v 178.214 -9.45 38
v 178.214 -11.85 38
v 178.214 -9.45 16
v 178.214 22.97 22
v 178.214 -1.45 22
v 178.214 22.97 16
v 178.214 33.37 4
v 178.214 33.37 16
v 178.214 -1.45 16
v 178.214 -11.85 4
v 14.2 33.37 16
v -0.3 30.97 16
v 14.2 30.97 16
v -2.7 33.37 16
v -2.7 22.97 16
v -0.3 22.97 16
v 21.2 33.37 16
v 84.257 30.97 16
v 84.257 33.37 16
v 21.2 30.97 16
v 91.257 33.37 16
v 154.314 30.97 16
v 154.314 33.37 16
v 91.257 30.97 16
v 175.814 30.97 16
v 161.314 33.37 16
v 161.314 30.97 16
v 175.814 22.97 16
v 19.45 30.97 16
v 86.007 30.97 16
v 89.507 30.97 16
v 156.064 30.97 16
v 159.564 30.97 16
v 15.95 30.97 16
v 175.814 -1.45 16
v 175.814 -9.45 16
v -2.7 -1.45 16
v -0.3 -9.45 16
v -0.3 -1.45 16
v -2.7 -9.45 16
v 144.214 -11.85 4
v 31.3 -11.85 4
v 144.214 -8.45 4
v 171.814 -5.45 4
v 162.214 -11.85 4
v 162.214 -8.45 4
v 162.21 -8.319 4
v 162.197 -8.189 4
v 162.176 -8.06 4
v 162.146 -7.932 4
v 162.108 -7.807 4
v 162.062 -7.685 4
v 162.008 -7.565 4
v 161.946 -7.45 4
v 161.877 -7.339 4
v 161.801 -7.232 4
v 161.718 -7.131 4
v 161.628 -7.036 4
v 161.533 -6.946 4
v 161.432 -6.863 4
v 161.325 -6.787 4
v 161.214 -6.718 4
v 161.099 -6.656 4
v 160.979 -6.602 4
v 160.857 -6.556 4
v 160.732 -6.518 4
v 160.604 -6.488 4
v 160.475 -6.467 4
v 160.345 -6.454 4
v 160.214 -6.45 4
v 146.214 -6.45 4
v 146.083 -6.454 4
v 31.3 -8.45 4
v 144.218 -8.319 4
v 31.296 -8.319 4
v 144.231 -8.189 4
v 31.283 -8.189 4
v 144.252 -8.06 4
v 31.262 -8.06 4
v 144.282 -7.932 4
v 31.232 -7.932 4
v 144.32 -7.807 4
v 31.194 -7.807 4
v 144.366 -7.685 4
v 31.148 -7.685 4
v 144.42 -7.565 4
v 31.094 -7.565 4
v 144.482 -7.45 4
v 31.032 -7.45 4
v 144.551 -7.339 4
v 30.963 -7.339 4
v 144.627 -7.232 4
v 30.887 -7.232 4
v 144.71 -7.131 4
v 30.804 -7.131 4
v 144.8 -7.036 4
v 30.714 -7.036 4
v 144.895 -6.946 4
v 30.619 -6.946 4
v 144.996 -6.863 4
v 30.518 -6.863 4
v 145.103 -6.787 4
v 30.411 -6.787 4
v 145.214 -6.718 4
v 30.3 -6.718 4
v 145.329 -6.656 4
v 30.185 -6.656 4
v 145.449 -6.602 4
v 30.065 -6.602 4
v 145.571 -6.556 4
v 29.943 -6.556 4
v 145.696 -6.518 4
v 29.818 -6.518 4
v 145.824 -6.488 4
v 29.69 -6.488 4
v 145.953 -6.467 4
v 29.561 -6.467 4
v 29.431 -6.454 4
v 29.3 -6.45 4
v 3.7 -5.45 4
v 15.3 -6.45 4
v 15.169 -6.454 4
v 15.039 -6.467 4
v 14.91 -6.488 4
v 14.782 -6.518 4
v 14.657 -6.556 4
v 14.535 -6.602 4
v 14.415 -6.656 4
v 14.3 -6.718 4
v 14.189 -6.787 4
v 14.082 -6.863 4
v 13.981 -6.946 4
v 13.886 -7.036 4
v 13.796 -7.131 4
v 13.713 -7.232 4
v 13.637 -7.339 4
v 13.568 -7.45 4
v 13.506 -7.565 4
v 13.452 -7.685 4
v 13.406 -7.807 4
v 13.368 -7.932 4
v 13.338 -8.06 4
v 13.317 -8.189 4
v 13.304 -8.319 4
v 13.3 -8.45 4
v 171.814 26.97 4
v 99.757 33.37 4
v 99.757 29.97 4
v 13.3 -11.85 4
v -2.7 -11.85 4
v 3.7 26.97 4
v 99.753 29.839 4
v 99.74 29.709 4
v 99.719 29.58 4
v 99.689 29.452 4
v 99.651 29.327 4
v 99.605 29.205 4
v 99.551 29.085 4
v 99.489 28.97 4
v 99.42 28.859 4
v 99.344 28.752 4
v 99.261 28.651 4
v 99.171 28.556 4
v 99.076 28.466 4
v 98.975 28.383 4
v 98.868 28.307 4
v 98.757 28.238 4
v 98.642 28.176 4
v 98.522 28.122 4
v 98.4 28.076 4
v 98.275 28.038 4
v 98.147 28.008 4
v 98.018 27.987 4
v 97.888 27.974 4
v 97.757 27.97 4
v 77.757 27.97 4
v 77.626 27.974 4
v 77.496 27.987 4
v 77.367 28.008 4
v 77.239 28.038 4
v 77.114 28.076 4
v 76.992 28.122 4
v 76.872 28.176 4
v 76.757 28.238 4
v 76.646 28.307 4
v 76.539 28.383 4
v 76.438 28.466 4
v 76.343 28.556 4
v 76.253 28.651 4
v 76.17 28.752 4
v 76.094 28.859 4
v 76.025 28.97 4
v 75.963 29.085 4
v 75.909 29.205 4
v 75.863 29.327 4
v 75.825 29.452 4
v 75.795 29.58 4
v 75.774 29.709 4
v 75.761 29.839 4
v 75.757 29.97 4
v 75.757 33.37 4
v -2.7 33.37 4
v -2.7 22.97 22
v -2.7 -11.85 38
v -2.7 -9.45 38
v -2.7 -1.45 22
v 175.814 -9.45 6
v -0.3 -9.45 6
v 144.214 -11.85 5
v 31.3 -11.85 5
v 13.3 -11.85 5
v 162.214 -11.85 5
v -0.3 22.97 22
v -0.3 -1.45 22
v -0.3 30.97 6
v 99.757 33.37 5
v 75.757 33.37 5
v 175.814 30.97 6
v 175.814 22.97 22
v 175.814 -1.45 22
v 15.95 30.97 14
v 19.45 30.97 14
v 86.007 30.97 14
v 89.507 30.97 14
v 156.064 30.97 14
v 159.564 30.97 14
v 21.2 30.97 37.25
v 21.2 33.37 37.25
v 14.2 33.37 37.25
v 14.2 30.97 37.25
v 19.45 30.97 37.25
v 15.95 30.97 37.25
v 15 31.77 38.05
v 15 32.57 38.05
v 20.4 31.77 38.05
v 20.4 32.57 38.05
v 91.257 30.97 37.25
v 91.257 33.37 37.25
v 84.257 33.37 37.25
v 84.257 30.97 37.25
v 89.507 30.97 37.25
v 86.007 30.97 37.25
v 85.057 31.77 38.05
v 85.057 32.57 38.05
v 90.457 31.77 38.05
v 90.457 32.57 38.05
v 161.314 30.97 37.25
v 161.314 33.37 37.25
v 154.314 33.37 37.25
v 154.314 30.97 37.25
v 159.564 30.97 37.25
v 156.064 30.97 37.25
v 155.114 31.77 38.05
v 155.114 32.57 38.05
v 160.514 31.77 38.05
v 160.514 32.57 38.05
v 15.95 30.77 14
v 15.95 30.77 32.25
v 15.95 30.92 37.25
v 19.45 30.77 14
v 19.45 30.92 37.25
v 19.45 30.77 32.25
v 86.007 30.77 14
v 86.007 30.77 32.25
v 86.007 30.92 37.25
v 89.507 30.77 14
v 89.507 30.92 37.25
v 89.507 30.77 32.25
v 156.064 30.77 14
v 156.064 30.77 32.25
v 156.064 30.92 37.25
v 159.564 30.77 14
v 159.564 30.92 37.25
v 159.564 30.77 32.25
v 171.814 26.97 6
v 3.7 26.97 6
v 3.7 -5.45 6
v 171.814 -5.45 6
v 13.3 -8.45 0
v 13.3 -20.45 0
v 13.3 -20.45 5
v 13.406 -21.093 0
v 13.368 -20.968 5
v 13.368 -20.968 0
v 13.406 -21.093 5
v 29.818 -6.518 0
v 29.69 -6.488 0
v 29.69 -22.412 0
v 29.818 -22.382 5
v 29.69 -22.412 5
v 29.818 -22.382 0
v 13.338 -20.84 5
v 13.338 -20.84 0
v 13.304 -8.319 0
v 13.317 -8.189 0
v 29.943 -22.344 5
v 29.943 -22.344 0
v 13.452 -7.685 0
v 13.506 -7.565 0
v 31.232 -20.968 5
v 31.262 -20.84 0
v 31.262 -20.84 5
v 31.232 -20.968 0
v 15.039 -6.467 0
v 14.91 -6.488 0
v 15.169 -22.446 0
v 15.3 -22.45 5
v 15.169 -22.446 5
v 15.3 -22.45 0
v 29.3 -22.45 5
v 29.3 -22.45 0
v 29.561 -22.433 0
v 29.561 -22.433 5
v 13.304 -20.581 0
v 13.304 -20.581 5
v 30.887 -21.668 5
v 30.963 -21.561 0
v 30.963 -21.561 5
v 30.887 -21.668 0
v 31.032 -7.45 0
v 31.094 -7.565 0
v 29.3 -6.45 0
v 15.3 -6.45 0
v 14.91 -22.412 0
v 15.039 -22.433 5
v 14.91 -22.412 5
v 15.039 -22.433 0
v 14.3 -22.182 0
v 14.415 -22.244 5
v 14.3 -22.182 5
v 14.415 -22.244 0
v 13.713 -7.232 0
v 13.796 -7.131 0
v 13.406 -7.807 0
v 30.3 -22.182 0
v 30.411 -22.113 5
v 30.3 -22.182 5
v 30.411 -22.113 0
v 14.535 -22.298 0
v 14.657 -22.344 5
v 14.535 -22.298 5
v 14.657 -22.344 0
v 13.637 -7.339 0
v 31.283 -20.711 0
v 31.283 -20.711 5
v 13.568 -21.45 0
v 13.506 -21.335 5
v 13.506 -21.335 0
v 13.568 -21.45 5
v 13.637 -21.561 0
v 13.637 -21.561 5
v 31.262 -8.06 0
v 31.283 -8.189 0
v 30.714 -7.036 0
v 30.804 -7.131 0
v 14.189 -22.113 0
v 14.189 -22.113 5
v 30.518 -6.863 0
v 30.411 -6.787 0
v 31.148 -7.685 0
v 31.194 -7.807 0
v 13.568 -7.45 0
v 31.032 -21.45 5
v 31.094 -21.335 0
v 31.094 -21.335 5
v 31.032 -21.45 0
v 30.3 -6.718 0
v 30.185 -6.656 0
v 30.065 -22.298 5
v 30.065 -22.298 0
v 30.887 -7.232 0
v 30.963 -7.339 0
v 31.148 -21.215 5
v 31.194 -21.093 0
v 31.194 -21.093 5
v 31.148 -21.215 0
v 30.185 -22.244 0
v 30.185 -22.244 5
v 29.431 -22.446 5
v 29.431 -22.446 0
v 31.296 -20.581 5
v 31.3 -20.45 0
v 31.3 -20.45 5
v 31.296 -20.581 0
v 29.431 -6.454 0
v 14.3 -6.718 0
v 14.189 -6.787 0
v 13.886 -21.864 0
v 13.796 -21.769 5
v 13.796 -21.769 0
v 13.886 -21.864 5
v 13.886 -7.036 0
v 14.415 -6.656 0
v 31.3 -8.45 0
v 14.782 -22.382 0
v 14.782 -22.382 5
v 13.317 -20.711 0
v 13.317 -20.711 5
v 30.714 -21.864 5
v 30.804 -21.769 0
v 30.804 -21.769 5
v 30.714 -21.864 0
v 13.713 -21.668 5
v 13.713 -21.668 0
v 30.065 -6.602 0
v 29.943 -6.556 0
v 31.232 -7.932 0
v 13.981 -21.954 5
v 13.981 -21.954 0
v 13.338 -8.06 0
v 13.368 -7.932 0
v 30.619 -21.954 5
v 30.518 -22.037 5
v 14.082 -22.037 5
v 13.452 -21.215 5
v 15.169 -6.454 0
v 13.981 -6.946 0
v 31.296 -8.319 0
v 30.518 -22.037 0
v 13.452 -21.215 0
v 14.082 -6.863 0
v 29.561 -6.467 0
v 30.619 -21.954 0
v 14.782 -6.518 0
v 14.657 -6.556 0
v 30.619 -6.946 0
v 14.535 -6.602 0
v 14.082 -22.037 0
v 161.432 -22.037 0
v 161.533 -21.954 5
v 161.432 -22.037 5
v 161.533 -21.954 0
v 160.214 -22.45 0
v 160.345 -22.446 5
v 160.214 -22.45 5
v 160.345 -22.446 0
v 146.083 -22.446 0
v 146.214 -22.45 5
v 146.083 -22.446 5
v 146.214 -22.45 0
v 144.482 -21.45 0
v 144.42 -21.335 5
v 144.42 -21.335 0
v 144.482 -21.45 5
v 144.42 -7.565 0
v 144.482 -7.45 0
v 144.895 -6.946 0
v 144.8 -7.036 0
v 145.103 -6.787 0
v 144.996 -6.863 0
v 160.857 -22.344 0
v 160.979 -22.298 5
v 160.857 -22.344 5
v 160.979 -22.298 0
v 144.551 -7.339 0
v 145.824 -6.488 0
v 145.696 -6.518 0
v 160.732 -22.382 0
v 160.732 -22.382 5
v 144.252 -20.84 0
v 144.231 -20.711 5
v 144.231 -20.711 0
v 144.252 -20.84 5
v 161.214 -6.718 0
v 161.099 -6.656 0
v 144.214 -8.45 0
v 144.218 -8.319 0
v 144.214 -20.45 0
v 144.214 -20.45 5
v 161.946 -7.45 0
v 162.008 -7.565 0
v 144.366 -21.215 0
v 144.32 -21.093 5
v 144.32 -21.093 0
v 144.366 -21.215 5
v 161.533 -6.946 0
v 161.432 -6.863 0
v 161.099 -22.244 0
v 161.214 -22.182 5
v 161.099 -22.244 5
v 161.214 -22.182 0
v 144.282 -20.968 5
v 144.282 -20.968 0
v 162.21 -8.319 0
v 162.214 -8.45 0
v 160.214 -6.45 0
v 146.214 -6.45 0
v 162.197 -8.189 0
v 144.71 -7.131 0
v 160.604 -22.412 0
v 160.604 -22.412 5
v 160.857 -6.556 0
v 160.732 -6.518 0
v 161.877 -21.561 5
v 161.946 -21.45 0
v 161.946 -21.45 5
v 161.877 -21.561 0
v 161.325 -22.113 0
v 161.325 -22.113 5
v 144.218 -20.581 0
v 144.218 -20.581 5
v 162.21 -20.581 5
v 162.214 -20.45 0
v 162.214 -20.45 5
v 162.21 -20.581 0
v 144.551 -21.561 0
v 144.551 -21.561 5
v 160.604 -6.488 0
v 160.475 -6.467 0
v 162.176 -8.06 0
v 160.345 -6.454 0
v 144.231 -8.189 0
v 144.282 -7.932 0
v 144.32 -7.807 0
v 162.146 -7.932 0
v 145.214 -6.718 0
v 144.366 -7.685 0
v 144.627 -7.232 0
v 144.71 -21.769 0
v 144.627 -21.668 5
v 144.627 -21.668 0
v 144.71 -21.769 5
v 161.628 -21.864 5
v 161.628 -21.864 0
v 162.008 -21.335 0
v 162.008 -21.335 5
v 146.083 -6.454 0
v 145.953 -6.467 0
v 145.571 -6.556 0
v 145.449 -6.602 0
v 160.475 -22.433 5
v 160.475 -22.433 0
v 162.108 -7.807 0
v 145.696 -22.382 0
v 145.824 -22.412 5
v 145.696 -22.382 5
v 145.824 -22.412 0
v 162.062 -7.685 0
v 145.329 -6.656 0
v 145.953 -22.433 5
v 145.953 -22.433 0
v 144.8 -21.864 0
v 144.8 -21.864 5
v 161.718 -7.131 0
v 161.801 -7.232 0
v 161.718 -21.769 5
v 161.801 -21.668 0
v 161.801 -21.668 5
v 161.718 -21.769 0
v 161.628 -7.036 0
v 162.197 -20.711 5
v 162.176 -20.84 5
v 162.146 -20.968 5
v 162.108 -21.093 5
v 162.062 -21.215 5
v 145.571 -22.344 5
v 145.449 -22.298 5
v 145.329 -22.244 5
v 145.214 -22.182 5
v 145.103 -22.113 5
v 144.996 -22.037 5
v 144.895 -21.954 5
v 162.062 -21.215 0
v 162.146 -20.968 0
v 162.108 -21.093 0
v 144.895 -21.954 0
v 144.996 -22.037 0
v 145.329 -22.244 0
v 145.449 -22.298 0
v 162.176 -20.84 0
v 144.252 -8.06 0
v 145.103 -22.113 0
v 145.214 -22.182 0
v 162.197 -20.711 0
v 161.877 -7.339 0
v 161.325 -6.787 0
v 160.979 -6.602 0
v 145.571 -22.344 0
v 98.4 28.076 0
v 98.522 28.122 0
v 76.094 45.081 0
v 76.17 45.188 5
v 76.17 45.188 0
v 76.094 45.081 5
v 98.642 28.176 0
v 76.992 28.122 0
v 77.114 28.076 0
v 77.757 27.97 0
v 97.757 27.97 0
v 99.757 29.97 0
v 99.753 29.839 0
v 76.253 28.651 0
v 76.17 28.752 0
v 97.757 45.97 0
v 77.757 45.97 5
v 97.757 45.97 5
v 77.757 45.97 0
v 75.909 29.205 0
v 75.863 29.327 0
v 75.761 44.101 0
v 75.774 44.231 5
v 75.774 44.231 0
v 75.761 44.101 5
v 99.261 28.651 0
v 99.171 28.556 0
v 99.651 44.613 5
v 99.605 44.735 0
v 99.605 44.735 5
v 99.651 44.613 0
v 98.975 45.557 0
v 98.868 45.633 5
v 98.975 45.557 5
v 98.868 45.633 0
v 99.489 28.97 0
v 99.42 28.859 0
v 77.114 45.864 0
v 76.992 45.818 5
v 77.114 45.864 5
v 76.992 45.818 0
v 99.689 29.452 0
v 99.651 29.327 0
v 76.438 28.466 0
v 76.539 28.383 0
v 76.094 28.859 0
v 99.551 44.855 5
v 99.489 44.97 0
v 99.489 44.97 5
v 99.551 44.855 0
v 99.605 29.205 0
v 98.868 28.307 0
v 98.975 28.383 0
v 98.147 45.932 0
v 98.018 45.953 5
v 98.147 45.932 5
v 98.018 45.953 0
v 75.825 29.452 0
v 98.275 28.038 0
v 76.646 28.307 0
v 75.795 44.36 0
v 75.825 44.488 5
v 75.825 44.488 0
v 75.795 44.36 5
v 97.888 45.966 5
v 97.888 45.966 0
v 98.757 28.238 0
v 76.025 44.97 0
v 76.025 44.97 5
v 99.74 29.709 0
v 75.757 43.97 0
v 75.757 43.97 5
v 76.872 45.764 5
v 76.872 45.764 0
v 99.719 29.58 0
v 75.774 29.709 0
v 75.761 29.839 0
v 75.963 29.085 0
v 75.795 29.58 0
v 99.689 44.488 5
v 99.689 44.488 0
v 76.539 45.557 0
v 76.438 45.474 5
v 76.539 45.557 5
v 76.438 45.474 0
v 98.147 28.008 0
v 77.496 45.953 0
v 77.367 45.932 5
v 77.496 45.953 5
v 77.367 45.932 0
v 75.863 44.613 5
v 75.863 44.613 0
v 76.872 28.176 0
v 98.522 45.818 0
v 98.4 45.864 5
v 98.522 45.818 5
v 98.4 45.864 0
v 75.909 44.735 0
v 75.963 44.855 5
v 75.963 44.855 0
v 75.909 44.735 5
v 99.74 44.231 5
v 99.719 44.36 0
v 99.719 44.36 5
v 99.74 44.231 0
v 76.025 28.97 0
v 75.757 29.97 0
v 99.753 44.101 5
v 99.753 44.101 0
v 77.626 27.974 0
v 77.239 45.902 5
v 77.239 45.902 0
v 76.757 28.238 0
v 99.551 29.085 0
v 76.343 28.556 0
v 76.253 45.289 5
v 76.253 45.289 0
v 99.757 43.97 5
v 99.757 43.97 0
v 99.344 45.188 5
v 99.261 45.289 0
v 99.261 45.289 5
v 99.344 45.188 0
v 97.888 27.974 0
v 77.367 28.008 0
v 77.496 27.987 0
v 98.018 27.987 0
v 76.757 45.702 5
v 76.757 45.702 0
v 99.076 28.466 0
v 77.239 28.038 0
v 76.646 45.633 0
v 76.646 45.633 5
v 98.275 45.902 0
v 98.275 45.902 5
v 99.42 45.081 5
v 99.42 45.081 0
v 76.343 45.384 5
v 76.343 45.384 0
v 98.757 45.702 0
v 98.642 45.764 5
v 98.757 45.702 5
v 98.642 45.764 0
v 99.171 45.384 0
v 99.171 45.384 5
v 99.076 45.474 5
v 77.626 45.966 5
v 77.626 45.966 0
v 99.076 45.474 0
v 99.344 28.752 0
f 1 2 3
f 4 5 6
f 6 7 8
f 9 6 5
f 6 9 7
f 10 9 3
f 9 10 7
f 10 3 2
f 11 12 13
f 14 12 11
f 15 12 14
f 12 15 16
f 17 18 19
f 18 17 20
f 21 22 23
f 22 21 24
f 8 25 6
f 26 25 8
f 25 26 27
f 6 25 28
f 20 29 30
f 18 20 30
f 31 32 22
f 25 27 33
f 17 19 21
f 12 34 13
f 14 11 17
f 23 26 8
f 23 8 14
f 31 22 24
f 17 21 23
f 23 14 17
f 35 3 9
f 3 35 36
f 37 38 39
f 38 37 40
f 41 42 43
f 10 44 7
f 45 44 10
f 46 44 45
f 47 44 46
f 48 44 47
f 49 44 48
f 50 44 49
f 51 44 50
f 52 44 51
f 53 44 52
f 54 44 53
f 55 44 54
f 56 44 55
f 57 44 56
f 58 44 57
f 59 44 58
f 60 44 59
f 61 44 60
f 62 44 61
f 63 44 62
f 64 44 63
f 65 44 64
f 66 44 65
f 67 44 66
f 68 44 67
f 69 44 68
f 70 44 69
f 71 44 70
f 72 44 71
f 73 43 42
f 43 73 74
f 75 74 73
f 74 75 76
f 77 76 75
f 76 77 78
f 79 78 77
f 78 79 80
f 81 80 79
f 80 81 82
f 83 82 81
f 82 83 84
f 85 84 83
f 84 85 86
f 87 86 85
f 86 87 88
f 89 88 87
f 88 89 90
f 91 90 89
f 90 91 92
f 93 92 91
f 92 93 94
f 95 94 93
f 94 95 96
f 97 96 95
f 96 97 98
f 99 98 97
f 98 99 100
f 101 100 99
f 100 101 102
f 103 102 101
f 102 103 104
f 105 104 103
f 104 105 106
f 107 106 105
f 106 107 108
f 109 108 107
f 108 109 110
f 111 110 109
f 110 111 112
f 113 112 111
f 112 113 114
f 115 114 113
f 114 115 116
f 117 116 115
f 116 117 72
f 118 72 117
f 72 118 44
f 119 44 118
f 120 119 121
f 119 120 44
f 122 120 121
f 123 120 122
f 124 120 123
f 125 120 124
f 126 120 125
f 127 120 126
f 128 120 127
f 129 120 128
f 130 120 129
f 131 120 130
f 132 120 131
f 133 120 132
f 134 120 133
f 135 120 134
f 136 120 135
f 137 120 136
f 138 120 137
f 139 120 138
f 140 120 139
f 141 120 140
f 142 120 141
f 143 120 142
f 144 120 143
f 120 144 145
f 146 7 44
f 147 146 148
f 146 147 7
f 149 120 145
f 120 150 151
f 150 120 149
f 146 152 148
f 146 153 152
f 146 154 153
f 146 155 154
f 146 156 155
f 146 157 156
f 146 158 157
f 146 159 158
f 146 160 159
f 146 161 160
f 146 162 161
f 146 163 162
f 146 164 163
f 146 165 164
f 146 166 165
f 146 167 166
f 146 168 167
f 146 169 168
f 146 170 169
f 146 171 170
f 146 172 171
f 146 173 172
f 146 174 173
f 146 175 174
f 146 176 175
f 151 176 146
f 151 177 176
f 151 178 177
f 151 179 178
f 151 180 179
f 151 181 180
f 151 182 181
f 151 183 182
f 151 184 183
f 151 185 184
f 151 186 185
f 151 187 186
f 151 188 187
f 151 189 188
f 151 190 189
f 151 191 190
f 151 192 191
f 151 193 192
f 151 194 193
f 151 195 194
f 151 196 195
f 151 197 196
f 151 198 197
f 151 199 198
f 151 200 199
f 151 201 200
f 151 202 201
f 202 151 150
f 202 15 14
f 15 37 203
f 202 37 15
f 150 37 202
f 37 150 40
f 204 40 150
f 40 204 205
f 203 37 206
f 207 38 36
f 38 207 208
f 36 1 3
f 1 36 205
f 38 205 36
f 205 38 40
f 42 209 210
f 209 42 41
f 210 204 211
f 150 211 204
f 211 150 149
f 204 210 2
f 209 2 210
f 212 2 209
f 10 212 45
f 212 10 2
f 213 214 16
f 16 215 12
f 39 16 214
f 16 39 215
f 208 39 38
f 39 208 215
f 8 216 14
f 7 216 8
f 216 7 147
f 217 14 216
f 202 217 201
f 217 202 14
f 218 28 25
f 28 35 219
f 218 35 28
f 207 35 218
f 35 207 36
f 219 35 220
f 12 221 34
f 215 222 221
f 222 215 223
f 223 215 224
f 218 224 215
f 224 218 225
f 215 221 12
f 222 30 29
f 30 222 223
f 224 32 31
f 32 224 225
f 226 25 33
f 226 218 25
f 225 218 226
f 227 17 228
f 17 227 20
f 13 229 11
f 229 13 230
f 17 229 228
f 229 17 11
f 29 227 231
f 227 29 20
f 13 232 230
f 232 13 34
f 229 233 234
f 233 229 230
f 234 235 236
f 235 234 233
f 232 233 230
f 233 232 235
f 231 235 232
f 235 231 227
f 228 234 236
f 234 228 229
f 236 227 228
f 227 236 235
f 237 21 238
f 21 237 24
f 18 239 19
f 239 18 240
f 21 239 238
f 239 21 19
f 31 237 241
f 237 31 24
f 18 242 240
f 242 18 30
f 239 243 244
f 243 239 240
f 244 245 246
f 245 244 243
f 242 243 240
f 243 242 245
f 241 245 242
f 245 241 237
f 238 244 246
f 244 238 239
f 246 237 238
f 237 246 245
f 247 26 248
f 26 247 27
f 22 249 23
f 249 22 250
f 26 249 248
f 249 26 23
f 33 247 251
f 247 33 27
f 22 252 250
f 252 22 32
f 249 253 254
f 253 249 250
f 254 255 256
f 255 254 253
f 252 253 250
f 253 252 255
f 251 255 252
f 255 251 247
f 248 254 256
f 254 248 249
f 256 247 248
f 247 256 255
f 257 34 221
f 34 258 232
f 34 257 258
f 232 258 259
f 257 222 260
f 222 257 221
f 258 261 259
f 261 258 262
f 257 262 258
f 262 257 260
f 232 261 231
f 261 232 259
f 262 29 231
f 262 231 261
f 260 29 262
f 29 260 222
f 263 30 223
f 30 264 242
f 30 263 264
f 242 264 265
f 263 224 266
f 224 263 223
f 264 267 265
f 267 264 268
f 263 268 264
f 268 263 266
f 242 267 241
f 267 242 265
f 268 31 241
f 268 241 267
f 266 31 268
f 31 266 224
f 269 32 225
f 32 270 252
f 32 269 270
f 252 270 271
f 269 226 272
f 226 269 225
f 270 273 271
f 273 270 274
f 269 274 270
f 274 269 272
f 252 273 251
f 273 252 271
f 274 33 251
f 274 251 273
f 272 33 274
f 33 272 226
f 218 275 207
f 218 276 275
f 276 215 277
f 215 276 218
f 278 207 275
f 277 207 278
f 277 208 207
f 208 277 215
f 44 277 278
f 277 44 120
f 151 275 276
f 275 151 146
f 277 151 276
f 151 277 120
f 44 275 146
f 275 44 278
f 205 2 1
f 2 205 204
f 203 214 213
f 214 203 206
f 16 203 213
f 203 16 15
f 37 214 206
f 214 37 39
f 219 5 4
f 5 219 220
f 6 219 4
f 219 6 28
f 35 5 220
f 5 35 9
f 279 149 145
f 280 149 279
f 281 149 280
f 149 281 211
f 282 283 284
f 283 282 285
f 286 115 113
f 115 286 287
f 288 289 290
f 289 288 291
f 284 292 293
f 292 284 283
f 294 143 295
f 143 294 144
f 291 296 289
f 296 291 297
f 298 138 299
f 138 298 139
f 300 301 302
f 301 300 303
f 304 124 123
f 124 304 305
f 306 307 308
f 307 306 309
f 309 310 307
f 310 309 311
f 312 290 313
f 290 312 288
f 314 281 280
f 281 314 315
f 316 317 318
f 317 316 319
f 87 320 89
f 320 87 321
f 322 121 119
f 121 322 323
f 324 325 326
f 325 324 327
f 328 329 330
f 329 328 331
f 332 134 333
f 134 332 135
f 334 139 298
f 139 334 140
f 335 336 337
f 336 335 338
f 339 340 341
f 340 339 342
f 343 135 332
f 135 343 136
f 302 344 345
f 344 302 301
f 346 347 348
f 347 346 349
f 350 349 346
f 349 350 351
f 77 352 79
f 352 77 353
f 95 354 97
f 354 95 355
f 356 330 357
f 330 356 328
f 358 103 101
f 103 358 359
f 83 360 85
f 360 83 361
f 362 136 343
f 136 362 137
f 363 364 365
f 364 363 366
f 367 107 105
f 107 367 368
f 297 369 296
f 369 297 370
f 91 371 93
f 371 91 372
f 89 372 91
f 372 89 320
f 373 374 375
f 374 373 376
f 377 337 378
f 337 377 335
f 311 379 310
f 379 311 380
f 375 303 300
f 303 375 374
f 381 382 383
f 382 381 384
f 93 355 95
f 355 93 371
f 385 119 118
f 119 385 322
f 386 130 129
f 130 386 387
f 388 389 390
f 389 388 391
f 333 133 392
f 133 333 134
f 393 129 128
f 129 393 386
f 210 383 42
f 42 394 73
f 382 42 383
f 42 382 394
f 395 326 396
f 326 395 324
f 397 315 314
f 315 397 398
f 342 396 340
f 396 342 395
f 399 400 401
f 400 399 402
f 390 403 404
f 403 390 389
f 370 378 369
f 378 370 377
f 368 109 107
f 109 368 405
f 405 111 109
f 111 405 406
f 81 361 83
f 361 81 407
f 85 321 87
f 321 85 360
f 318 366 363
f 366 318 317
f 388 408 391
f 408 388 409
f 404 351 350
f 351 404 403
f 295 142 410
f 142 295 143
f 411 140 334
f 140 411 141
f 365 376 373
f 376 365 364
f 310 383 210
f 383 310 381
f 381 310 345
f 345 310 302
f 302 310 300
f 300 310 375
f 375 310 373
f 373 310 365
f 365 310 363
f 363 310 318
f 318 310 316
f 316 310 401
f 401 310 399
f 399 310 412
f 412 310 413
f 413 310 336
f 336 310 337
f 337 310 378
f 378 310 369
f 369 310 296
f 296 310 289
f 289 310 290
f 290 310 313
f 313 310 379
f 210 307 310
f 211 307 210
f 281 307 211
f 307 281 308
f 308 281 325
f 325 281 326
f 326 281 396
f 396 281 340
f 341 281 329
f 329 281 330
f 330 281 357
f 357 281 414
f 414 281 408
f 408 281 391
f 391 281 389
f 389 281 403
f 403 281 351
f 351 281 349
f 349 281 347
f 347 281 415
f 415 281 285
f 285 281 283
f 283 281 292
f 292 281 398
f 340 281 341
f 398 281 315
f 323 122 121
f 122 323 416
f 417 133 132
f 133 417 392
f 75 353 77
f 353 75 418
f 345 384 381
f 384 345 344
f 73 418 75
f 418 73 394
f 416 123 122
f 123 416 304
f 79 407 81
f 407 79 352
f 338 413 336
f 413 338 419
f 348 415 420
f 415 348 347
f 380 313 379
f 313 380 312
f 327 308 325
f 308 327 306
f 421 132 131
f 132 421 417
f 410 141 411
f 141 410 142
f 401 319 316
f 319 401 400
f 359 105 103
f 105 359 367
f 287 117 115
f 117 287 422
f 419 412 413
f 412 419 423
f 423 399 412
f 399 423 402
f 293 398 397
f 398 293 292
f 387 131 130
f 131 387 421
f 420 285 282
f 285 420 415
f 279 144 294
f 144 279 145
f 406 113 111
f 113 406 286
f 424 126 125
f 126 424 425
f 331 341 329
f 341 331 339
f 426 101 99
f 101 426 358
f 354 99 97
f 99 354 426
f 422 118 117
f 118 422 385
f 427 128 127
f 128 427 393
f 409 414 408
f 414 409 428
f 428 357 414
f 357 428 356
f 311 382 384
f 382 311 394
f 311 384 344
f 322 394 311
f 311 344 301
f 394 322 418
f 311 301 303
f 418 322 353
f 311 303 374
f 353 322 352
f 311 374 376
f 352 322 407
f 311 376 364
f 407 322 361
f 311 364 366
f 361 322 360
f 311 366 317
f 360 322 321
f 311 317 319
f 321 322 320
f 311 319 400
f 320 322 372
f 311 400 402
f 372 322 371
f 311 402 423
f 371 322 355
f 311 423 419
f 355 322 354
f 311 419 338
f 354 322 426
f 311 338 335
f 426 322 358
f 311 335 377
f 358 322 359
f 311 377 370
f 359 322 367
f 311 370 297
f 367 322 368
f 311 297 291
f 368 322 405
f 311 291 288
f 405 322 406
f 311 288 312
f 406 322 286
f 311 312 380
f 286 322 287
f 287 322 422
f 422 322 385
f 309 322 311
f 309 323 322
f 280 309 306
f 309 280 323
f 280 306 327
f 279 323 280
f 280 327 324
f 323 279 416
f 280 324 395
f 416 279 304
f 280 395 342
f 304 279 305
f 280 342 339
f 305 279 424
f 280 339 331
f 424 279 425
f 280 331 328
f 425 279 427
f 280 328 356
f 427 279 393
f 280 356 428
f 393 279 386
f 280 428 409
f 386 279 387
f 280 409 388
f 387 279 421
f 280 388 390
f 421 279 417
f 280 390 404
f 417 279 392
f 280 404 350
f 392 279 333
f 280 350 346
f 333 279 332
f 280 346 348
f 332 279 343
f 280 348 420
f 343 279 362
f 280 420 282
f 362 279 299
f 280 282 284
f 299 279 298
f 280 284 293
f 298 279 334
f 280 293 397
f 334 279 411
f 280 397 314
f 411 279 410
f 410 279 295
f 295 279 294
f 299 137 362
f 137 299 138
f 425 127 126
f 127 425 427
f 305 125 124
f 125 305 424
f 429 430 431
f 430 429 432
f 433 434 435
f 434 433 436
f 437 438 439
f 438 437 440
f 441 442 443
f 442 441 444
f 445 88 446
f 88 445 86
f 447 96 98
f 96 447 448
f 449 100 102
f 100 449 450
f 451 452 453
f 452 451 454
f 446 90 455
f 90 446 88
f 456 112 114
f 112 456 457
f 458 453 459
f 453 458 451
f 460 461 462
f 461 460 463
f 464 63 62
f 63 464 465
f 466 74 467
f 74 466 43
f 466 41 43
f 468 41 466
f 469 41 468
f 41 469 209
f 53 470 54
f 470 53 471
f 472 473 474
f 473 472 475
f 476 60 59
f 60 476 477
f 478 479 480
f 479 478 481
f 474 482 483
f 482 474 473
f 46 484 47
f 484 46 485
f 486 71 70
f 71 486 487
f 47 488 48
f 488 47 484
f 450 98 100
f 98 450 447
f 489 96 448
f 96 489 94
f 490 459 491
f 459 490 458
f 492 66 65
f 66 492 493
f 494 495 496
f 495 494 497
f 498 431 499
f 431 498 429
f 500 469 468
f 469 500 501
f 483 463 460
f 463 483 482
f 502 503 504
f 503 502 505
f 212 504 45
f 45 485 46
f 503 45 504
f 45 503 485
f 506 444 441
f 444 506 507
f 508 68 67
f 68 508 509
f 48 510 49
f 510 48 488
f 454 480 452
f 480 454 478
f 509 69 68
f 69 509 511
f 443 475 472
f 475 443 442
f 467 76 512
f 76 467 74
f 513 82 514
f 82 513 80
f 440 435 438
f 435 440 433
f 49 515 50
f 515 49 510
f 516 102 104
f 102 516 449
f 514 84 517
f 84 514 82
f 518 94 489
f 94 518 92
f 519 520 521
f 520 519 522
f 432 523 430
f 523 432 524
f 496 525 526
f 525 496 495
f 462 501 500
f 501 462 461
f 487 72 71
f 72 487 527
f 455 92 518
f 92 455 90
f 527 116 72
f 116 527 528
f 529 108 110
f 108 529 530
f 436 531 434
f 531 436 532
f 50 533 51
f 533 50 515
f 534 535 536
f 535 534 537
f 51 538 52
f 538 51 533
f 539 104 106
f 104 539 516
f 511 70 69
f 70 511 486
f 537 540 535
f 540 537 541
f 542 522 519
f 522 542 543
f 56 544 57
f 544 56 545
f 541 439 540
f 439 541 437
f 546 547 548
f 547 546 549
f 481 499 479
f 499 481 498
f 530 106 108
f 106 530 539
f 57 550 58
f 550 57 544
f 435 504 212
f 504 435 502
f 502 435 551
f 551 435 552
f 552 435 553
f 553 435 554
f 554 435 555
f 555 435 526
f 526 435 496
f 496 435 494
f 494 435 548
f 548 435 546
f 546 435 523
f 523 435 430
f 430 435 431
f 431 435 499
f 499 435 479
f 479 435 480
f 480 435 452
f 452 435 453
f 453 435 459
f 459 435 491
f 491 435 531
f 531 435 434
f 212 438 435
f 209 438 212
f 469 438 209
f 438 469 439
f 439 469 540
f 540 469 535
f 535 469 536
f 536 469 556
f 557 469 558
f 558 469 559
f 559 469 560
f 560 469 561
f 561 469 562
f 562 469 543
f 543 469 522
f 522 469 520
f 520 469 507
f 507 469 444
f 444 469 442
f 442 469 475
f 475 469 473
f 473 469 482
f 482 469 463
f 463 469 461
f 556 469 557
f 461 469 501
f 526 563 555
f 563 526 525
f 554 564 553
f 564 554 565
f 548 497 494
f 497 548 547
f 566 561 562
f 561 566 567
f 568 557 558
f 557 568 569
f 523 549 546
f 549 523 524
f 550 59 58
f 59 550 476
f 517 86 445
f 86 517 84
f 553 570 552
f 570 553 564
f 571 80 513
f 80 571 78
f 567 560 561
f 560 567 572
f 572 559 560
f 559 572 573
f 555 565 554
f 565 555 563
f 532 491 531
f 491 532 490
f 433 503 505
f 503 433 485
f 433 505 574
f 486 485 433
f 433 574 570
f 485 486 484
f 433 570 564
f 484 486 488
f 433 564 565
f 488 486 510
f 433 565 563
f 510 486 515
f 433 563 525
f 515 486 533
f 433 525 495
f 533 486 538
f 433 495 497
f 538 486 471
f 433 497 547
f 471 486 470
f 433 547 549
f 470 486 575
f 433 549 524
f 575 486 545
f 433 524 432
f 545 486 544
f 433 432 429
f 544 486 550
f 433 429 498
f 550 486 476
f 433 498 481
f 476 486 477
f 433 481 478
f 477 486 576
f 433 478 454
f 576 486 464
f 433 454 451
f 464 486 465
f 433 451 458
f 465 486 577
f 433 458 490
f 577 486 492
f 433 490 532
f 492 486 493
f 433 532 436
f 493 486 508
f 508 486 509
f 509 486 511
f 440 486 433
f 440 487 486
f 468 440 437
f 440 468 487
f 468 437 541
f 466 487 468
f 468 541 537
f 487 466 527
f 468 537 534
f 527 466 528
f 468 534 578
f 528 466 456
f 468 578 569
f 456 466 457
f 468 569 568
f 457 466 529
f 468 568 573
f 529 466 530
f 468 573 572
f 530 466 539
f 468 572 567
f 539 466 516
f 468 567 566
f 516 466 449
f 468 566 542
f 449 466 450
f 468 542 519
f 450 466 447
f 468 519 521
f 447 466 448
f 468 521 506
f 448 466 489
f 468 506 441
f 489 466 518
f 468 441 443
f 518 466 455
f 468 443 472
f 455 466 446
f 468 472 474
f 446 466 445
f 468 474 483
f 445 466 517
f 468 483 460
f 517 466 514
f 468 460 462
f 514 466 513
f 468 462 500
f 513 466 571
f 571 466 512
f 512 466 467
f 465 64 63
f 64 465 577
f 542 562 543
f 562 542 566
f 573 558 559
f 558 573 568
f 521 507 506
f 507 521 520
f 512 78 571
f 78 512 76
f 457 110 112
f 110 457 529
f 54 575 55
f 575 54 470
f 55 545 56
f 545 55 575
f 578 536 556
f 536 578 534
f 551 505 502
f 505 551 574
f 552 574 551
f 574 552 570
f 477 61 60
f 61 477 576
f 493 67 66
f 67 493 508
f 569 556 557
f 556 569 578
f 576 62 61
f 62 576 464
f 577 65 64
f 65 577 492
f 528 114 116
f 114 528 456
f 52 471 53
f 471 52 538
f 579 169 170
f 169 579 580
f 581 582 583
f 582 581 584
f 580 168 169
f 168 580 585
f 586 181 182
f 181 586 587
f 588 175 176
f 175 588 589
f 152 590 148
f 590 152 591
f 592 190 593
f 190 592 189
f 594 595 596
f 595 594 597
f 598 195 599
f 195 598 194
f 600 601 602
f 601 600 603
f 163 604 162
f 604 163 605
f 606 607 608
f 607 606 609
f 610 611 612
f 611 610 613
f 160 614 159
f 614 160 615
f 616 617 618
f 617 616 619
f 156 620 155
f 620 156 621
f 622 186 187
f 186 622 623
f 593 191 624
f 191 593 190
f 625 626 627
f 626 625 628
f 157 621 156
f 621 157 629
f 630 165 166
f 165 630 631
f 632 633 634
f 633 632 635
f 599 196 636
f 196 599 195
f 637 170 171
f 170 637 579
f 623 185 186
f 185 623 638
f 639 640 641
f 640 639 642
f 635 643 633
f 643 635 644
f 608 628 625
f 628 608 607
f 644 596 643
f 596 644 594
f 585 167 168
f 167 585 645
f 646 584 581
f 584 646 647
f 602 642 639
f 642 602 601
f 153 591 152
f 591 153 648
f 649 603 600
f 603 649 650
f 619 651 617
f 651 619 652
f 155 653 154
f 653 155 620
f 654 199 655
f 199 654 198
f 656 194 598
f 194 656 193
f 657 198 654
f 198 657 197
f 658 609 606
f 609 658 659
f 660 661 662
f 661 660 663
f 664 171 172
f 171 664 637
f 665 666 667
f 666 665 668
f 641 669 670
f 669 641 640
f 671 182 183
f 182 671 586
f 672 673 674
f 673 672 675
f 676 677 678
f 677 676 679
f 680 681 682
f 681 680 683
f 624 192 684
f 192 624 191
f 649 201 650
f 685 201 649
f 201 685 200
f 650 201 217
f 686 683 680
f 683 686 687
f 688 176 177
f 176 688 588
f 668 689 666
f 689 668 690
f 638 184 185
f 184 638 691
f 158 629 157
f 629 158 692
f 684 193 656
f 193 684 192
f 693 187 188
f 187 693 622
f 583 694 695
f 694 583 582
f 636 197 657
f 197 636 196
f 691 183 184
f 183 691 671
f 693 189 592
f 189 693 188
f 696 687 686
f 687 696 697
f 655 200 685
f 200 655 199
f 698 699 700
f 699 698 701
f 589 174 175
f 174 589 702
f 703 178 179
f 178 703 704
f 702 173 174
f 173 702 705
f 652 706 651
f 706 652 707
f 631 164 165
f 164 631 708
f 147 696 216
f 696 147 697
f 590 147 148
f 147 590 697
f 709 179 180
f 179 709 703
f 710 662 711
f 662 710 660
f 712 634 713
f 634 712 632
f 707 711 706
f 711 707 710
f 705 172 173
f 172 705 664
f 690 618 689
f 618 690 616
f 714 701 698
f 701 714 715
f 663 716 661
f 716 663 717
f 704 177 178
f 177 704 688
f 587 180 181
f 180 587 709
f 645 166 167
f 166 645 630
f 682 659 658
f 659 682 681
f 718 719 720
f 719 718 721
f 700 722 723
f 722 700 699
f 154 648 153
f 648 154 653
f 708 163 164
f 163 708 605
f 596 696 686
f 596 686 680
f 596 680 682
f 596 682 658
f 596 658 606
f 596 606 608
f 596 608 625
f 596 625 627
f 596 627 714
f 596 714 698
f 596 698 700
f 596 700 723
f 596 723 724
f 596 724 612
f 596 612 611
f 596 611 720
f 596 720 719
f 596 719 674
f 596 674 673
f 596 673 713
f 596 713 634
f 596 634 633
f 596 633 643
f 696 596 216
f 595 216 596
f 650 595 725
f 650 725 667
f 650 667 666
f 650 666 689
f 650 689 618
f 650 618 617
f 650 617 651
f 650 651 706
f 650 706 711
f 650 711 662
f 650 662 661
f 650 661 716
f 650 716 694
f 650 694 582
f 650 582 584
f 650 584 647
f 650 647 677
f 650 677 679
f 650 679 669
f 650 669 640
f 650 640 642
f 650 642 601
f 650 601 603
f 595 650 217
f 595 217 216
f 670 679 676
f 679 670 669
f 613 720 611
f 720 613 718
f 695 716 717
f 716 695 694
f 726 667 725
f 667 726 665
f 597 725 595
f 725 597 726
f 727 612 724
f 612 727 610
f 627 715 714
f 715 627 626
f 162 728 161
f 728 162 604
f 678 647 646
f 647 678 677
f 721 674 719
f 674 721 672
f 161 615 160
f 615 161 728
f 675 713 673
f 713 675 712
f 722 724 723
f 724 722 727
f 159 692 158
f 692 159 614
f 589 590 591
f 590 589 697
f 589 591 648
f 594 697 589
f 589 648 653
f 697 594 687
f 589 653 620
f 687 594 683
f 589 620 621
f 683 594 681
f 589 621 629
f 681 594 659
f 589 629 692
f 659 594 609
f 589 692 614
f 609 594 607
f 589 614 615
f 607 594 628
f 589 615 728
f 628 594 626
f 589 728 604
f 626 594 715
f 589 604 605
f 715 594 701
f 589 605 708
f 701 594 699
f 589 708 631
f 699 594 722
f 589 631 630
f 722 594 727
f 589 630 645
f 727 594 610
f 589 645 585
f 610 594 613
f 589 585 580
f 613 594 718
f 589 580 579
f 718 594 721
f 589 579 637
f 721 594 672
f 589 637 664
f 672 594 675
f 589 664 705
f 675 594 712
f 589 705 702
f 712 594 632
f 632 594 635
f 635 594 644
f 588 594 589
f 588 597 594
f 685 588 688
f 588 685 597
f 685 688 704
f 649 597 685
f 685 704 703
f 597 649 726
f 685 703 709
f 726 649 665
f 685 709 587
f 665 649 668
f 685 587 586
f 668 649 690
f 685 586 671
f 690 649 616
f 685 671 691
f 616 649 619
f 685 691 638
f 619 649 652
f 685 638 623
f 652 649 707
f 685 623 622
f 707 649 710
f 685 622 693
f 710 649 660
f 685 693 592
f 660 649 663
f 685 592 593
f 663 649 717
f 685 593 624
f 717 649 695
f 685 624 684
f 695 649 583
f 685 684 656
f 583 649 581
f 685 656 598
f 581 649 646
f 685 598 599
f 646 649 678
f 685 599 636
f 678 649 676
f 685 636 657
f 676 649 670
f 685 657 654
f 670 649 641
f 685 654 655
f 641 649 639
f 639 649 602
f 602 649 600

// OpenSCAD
// DOUBLE TAKE FRAMES DESIGN RELEASE
// DTF_RELEASE: 2.0.3
// Released: 2026-09-04
// Versioning: Semantic Versioning 2.0.0 (https://semver.org/)
// Status: CANONICAL
// Changes in 2.0.3:
// - Carried forward unchanged for the corrected prepared-project packaging.
// Changes in 2.0.2:
// - Carried forward unchanged for the native 3MF packaging hotfix.
// Changes in 2.0.1:
// - Carried forward unchanged for the prepared-project packaging correction.
// Changes in 2.0.0:
// - Carried forward without geometry changes for the coordinated 2.0.0 release.
// Full release notes: https://doubletakeframes.com/build/#design-release
//
$fn = 96;
eps = 0.05;

// =========================================================
// DETACHABLE FRONT BAND + SIDE WALLS + REAR POSTS + FEETS
// Continuous low rail all around.
// Side walls sit on rail but do not connect to front/back above rail.
// Non-friction resting fit.
//
// Corrected:
// - Feet overlap collar/body in Z by foot_body_z_overlap, not just eps.
// - Each foot is shifted a few mm inward under the basket while keeping
//   the original front/rear foot depth.
// =========================================================

inch = 25.4;

// CASSETTE REFERENCE VALUES
cassette_w = 6.91 * inch;

bottom_t    = 3.0;
wall_t      = 3.0;
wall_offset = 0.0;

front_frame_t    = 1.2;
acrylic_gap      = 1.0;
spacer_thickness = 7.0;

front_buildout_total = front_frame_t + acrylic_gap + spacer_thickness;
front_buildout_y0    = wall_offset - front_buildout_total;

roller_r    = 0.75 * inch;
glide_t     = 2.0;
fang_embed  = 0.6;
rail_back_y = 8.0;
roller_cy   = wall_offset + wall_t;

glide_y  = roller_cy + roller_r - glide_t - fang_embed;
bottom_d = glide_y + glide_t + rail_back_y;

backing_board_extra_y = 1/20 * inch;

cassette_x0 = 0;
cassette_x1 = cassette_w;
cassette_y0 = front_buildout_y0;
cassette_y1 = bottom_d + backing_board_extra_y;

// FIT / GEOMETRY
clear_x = 0.3;
clear_y = 0.25;

collar_t = 2.4;

foot_h = 5.0;
foot_body_z_overlap = 1.0;
collar_z0 = foot_h - foot_body_z_overlap;

collar_h = 34.0;
side_wall_h = 18.0;
inner_x0 = cassette_x0 - clear_x;
inner_x1 = cassette_x1 + clear_x;
inner_y0 = cassette_y0 - clear_y;
inner_y1 = cassette_y1 + clear_y;

outer_x0 = inner_x0 - collar_t;
outer_x1 = inner_x1 + collar_t;
outer_y0 = inner_y0 - collar_t;
outer_y1 = inner_y1 + collar_t;

// RESTING LEDGE
rest_lip_t = 4.0;
rest_lip_h = 2.0;

// LOW RAIL
low_rail_h = 12.0;

// SIDE WALLS
side_wall_gap_front = 8.0;
side_wall_gap_rear  = 8.0;
side_wall_t = collar_t;

// REAR POSTS
rear_post_w = 7.0;
rear_post_t = collar_t;
post_bevel = 0.8;

// Localized friction take-up on the three rear backing-board capture posts.
// These project into the existing Y clearance without moving the posts or
// tightening the stand's overall envelope. The upper ramp eases insertion.
rear_post_friction_pad_d = 0.20;
rear_post_friction_pad_w = 3.5;
rear_post_friction_pad_z0 = collar_z0 + low_rail_h - 2.0;
rear_post_friction_pad_z1 = collar_z0 + collar_h - post_bevel;
rear_post_friction_ramp_h = 5.0;

// FEET
front_foot_proj = 16.0;
rear_foot_proj  = 18.0;

front_foot_w = 18.0;
rear_foot_w  = 24.0;

front_foot_inset_x = 16.0;
foot_round = 2.0;

// How far the inner edge of each foot reaches under the basket.
// Original effectively stopped ~0.6 mm short of the inner edge.
foot_y_overlap = 3.0;

// HELPERS
module rounded_rect_prism(x0, x1, y0, y1, z0, z1, r=2) {
    hull() {
        translate([x0+r, y0+r, z0]) cylinder(r=r, h=z1-z0);
        translate([x1-r, y0+r, z0]) cylinder(r=r, h=z1-z0);
        translate([x0+r, y1-r, z0]) cylinder(r=r, h=z1-z0);
        translate([x1-r, y1-r, z0]) cylinder(r=r, h=z1-z0);
    }
}

module beveled_post(xsz, ysz, h, b) {
    bx = min(b, xsz/2 - eps);
    by = min(b, ysz/2 - eps);

    union() {
        cube([xsz, ysz, h - b]);

        translate([0, 0, h - b])
        hull() {
            cube([xsz, ysz, eps]);

            translate([bx, by, b])
                cube([
                    max(eps, xsz - 2*bx),
                    max(eps, ysz - 2*by),
                    eps
                ]);
        }
    }
}

// FRONT BAND
module front_band() {
    translate([outer_x0, outer_y0, collar_z0])
        cube([
            outer_x1 - outer_x0,
            collar_t,
            collar_h
        ]);
}

// CONTINUOUS LOW RAIL
module front_low_rail() {
    translate([outer_x0, outer_y0, collar_z0])
        cube([outer_x1 - outer_x0, collar_t, low_rail_h]);
}

module left_low_rail() {
    translate([outer_x0, outer_y0, collar_z0])
        cube([collar_t, outer_y1 - outer_y0, low_rail_h]);
}

module right_low_rail() {
    translate([outer_x1 - collar_t, outer_y0, collar_z0])
        cube([collar_t, outer_y1 - outer_y0, low_rail_h]);
}

module rear_low_rail() {
    translate([outer_x0, outer_y1 - collar_t, collar_z0])
        cube([outer_x1 - outer_x0, collar_t, low_rail_h]);
}

module low_rails() {
    // front rail overlaps lower part of front band; harmless and strengthens base
    front_low_rail();
    left_low_rail();
    right_low_rail();
    rear_low_rail();
}

// SIDE WALLS
module left_side_wall() {
    y0 = inner_y0 + side_wall_gap_front;
    y1 = inner_y1 - side_wall_gap_rear;

    translate([outer_x0, y0, collar_z0])
        cube([
            side_wall_t,
            y1 - y0,
            side_wall_h
        ]);
}

module right_side_wall() {
    y0 = inner_y0 + side_wall_gap_front;
    y1 = inner_y1 - side_wall_gap_rear;

    translate([inner_x1, y0, collar_z0])
        cube([
            side_wall_t,
            y1 - y0,
            side_wall_h
        ]);
}

// REAR POSTS
module rear_post(x_center) {
    translate([x_center - rear_post_w/2, inner_y1, collar_z0])
        beveled_post(rear_post_w, rear_post_t, collar_h, post_bevel);
}

module rear_post_friction_pad(x_center) {
    pad_x0 = x_center - rear_post_friction_pad_w/2;
    full_pad_y0 = inner_y1 - rear_post_friction_pad_d;
    ramp_z0 = rear_post_friction_pad_z1 - rear_post_friction_ramp_h;

    hull() {
        translate([pad_x0, full_pad_y0, rear_post_friction_pad_z0])
            cube([rear_post_friction_pad_w, rear_post_friction_pad_d + eps, eps]);
        translate([pad_x0, full_pad_y0, ramp_z0])
            cube([rear_post_friction_pad_w, rear_post_friction_pad_d + eps, eps]);
        translate([pad_x0, inner_y1 - eps, rear_post_friction_pad_z1])
            cube([rear_post_friction_pad_w, 2*eps, eps]);
    }
}

module rear_posts() {
    left_post_x = inner_x0 + 18.0;
    center_post_x = (inner_x0 + inner_x1) / 2;
    right_post_x = inner_x1 - 18.0;

    rear_post(left_post_x);
    rear_post(center_post_x);
    rear_post(right_post_x);

    rear_post_friction_pad(left_post_x);
    rear_post_friction_pad(center_post_x);
    rear_post_friction_pad(right_post_x);
}

// BOTTOM RESTING LEDGE
module bottom_rest_lip() {
    translate([inner_x0, inner_y0, collar_z0])
        cube([inner_x1 - inner_x0, rest_lip_t, rest_lip_h]);

    translate([inner_x0, inner_y1 - rest_lip_t, collar_z0])
        cube([inner_x1 - inner_x0, rest_lip_t, rest_lip_h]);

    translate([inner_x0, inner_y0, collar_z0])
        cube([rest_lip_t, inner_y1 - inner_y0, rest_lip_h]);

    translate([inner_x1 - rest_lip_t, inner_y0, collar_z0])
        cube([rest_lip_t, inner_y1 - inner_y0, rest_lip_h]);
}

// FEET
module front_left_foot() {
    x0 = outer_x0 + front_foot_inset_x;
    x1 = x0 + front_foot_w;

    // Same foot depth as original, shifted inward for a few mm of underlap.
    y1 = inner_y0 + foot_y_overlap;
    y0 = y1 - front_foot_proj;

    rounded_rect_prism(x0, x1, y0, y1, 0, foot_h, foot_round);
}

module front_right_foot() {
    x1 = outer_x1 - front_foot_inset_x;
    x0 = x1 - front_foot_w;

    // Same foot depth as original, shifted inward for a few mm of underlap.
    y1 = inner_y0 + foot_y_overlap;
    y0 = y1 - front_foot_proj;

    rounded_rect_prism(x0, x1, y0, y1, 0, foot_h, foot_round);
}

module rear_center_foot() {
    x0 = (outer_x0 + outer_x1)/2 - rear_foot_w/2;
    x1 = x0 + rear_foot_w;

    // Same foot depth as original, shifted inward for a few mm of underlap.
    y0 = inner_y1 - foot_y_overlap;
    y1 = y0 + rear_foot_proj;

    rounded_rect_prism(x0, x1, y0, y1, 0, foot_h, foot_round);
}

// FINAL
union() {
    front_band();
    low_rails();

    left_side_wall();
    right_side_wall();
    rear_posts();

    bottom_rest_lip();

    front_left_foot();
    front_right_foot();
    rear_center_foot();
}
